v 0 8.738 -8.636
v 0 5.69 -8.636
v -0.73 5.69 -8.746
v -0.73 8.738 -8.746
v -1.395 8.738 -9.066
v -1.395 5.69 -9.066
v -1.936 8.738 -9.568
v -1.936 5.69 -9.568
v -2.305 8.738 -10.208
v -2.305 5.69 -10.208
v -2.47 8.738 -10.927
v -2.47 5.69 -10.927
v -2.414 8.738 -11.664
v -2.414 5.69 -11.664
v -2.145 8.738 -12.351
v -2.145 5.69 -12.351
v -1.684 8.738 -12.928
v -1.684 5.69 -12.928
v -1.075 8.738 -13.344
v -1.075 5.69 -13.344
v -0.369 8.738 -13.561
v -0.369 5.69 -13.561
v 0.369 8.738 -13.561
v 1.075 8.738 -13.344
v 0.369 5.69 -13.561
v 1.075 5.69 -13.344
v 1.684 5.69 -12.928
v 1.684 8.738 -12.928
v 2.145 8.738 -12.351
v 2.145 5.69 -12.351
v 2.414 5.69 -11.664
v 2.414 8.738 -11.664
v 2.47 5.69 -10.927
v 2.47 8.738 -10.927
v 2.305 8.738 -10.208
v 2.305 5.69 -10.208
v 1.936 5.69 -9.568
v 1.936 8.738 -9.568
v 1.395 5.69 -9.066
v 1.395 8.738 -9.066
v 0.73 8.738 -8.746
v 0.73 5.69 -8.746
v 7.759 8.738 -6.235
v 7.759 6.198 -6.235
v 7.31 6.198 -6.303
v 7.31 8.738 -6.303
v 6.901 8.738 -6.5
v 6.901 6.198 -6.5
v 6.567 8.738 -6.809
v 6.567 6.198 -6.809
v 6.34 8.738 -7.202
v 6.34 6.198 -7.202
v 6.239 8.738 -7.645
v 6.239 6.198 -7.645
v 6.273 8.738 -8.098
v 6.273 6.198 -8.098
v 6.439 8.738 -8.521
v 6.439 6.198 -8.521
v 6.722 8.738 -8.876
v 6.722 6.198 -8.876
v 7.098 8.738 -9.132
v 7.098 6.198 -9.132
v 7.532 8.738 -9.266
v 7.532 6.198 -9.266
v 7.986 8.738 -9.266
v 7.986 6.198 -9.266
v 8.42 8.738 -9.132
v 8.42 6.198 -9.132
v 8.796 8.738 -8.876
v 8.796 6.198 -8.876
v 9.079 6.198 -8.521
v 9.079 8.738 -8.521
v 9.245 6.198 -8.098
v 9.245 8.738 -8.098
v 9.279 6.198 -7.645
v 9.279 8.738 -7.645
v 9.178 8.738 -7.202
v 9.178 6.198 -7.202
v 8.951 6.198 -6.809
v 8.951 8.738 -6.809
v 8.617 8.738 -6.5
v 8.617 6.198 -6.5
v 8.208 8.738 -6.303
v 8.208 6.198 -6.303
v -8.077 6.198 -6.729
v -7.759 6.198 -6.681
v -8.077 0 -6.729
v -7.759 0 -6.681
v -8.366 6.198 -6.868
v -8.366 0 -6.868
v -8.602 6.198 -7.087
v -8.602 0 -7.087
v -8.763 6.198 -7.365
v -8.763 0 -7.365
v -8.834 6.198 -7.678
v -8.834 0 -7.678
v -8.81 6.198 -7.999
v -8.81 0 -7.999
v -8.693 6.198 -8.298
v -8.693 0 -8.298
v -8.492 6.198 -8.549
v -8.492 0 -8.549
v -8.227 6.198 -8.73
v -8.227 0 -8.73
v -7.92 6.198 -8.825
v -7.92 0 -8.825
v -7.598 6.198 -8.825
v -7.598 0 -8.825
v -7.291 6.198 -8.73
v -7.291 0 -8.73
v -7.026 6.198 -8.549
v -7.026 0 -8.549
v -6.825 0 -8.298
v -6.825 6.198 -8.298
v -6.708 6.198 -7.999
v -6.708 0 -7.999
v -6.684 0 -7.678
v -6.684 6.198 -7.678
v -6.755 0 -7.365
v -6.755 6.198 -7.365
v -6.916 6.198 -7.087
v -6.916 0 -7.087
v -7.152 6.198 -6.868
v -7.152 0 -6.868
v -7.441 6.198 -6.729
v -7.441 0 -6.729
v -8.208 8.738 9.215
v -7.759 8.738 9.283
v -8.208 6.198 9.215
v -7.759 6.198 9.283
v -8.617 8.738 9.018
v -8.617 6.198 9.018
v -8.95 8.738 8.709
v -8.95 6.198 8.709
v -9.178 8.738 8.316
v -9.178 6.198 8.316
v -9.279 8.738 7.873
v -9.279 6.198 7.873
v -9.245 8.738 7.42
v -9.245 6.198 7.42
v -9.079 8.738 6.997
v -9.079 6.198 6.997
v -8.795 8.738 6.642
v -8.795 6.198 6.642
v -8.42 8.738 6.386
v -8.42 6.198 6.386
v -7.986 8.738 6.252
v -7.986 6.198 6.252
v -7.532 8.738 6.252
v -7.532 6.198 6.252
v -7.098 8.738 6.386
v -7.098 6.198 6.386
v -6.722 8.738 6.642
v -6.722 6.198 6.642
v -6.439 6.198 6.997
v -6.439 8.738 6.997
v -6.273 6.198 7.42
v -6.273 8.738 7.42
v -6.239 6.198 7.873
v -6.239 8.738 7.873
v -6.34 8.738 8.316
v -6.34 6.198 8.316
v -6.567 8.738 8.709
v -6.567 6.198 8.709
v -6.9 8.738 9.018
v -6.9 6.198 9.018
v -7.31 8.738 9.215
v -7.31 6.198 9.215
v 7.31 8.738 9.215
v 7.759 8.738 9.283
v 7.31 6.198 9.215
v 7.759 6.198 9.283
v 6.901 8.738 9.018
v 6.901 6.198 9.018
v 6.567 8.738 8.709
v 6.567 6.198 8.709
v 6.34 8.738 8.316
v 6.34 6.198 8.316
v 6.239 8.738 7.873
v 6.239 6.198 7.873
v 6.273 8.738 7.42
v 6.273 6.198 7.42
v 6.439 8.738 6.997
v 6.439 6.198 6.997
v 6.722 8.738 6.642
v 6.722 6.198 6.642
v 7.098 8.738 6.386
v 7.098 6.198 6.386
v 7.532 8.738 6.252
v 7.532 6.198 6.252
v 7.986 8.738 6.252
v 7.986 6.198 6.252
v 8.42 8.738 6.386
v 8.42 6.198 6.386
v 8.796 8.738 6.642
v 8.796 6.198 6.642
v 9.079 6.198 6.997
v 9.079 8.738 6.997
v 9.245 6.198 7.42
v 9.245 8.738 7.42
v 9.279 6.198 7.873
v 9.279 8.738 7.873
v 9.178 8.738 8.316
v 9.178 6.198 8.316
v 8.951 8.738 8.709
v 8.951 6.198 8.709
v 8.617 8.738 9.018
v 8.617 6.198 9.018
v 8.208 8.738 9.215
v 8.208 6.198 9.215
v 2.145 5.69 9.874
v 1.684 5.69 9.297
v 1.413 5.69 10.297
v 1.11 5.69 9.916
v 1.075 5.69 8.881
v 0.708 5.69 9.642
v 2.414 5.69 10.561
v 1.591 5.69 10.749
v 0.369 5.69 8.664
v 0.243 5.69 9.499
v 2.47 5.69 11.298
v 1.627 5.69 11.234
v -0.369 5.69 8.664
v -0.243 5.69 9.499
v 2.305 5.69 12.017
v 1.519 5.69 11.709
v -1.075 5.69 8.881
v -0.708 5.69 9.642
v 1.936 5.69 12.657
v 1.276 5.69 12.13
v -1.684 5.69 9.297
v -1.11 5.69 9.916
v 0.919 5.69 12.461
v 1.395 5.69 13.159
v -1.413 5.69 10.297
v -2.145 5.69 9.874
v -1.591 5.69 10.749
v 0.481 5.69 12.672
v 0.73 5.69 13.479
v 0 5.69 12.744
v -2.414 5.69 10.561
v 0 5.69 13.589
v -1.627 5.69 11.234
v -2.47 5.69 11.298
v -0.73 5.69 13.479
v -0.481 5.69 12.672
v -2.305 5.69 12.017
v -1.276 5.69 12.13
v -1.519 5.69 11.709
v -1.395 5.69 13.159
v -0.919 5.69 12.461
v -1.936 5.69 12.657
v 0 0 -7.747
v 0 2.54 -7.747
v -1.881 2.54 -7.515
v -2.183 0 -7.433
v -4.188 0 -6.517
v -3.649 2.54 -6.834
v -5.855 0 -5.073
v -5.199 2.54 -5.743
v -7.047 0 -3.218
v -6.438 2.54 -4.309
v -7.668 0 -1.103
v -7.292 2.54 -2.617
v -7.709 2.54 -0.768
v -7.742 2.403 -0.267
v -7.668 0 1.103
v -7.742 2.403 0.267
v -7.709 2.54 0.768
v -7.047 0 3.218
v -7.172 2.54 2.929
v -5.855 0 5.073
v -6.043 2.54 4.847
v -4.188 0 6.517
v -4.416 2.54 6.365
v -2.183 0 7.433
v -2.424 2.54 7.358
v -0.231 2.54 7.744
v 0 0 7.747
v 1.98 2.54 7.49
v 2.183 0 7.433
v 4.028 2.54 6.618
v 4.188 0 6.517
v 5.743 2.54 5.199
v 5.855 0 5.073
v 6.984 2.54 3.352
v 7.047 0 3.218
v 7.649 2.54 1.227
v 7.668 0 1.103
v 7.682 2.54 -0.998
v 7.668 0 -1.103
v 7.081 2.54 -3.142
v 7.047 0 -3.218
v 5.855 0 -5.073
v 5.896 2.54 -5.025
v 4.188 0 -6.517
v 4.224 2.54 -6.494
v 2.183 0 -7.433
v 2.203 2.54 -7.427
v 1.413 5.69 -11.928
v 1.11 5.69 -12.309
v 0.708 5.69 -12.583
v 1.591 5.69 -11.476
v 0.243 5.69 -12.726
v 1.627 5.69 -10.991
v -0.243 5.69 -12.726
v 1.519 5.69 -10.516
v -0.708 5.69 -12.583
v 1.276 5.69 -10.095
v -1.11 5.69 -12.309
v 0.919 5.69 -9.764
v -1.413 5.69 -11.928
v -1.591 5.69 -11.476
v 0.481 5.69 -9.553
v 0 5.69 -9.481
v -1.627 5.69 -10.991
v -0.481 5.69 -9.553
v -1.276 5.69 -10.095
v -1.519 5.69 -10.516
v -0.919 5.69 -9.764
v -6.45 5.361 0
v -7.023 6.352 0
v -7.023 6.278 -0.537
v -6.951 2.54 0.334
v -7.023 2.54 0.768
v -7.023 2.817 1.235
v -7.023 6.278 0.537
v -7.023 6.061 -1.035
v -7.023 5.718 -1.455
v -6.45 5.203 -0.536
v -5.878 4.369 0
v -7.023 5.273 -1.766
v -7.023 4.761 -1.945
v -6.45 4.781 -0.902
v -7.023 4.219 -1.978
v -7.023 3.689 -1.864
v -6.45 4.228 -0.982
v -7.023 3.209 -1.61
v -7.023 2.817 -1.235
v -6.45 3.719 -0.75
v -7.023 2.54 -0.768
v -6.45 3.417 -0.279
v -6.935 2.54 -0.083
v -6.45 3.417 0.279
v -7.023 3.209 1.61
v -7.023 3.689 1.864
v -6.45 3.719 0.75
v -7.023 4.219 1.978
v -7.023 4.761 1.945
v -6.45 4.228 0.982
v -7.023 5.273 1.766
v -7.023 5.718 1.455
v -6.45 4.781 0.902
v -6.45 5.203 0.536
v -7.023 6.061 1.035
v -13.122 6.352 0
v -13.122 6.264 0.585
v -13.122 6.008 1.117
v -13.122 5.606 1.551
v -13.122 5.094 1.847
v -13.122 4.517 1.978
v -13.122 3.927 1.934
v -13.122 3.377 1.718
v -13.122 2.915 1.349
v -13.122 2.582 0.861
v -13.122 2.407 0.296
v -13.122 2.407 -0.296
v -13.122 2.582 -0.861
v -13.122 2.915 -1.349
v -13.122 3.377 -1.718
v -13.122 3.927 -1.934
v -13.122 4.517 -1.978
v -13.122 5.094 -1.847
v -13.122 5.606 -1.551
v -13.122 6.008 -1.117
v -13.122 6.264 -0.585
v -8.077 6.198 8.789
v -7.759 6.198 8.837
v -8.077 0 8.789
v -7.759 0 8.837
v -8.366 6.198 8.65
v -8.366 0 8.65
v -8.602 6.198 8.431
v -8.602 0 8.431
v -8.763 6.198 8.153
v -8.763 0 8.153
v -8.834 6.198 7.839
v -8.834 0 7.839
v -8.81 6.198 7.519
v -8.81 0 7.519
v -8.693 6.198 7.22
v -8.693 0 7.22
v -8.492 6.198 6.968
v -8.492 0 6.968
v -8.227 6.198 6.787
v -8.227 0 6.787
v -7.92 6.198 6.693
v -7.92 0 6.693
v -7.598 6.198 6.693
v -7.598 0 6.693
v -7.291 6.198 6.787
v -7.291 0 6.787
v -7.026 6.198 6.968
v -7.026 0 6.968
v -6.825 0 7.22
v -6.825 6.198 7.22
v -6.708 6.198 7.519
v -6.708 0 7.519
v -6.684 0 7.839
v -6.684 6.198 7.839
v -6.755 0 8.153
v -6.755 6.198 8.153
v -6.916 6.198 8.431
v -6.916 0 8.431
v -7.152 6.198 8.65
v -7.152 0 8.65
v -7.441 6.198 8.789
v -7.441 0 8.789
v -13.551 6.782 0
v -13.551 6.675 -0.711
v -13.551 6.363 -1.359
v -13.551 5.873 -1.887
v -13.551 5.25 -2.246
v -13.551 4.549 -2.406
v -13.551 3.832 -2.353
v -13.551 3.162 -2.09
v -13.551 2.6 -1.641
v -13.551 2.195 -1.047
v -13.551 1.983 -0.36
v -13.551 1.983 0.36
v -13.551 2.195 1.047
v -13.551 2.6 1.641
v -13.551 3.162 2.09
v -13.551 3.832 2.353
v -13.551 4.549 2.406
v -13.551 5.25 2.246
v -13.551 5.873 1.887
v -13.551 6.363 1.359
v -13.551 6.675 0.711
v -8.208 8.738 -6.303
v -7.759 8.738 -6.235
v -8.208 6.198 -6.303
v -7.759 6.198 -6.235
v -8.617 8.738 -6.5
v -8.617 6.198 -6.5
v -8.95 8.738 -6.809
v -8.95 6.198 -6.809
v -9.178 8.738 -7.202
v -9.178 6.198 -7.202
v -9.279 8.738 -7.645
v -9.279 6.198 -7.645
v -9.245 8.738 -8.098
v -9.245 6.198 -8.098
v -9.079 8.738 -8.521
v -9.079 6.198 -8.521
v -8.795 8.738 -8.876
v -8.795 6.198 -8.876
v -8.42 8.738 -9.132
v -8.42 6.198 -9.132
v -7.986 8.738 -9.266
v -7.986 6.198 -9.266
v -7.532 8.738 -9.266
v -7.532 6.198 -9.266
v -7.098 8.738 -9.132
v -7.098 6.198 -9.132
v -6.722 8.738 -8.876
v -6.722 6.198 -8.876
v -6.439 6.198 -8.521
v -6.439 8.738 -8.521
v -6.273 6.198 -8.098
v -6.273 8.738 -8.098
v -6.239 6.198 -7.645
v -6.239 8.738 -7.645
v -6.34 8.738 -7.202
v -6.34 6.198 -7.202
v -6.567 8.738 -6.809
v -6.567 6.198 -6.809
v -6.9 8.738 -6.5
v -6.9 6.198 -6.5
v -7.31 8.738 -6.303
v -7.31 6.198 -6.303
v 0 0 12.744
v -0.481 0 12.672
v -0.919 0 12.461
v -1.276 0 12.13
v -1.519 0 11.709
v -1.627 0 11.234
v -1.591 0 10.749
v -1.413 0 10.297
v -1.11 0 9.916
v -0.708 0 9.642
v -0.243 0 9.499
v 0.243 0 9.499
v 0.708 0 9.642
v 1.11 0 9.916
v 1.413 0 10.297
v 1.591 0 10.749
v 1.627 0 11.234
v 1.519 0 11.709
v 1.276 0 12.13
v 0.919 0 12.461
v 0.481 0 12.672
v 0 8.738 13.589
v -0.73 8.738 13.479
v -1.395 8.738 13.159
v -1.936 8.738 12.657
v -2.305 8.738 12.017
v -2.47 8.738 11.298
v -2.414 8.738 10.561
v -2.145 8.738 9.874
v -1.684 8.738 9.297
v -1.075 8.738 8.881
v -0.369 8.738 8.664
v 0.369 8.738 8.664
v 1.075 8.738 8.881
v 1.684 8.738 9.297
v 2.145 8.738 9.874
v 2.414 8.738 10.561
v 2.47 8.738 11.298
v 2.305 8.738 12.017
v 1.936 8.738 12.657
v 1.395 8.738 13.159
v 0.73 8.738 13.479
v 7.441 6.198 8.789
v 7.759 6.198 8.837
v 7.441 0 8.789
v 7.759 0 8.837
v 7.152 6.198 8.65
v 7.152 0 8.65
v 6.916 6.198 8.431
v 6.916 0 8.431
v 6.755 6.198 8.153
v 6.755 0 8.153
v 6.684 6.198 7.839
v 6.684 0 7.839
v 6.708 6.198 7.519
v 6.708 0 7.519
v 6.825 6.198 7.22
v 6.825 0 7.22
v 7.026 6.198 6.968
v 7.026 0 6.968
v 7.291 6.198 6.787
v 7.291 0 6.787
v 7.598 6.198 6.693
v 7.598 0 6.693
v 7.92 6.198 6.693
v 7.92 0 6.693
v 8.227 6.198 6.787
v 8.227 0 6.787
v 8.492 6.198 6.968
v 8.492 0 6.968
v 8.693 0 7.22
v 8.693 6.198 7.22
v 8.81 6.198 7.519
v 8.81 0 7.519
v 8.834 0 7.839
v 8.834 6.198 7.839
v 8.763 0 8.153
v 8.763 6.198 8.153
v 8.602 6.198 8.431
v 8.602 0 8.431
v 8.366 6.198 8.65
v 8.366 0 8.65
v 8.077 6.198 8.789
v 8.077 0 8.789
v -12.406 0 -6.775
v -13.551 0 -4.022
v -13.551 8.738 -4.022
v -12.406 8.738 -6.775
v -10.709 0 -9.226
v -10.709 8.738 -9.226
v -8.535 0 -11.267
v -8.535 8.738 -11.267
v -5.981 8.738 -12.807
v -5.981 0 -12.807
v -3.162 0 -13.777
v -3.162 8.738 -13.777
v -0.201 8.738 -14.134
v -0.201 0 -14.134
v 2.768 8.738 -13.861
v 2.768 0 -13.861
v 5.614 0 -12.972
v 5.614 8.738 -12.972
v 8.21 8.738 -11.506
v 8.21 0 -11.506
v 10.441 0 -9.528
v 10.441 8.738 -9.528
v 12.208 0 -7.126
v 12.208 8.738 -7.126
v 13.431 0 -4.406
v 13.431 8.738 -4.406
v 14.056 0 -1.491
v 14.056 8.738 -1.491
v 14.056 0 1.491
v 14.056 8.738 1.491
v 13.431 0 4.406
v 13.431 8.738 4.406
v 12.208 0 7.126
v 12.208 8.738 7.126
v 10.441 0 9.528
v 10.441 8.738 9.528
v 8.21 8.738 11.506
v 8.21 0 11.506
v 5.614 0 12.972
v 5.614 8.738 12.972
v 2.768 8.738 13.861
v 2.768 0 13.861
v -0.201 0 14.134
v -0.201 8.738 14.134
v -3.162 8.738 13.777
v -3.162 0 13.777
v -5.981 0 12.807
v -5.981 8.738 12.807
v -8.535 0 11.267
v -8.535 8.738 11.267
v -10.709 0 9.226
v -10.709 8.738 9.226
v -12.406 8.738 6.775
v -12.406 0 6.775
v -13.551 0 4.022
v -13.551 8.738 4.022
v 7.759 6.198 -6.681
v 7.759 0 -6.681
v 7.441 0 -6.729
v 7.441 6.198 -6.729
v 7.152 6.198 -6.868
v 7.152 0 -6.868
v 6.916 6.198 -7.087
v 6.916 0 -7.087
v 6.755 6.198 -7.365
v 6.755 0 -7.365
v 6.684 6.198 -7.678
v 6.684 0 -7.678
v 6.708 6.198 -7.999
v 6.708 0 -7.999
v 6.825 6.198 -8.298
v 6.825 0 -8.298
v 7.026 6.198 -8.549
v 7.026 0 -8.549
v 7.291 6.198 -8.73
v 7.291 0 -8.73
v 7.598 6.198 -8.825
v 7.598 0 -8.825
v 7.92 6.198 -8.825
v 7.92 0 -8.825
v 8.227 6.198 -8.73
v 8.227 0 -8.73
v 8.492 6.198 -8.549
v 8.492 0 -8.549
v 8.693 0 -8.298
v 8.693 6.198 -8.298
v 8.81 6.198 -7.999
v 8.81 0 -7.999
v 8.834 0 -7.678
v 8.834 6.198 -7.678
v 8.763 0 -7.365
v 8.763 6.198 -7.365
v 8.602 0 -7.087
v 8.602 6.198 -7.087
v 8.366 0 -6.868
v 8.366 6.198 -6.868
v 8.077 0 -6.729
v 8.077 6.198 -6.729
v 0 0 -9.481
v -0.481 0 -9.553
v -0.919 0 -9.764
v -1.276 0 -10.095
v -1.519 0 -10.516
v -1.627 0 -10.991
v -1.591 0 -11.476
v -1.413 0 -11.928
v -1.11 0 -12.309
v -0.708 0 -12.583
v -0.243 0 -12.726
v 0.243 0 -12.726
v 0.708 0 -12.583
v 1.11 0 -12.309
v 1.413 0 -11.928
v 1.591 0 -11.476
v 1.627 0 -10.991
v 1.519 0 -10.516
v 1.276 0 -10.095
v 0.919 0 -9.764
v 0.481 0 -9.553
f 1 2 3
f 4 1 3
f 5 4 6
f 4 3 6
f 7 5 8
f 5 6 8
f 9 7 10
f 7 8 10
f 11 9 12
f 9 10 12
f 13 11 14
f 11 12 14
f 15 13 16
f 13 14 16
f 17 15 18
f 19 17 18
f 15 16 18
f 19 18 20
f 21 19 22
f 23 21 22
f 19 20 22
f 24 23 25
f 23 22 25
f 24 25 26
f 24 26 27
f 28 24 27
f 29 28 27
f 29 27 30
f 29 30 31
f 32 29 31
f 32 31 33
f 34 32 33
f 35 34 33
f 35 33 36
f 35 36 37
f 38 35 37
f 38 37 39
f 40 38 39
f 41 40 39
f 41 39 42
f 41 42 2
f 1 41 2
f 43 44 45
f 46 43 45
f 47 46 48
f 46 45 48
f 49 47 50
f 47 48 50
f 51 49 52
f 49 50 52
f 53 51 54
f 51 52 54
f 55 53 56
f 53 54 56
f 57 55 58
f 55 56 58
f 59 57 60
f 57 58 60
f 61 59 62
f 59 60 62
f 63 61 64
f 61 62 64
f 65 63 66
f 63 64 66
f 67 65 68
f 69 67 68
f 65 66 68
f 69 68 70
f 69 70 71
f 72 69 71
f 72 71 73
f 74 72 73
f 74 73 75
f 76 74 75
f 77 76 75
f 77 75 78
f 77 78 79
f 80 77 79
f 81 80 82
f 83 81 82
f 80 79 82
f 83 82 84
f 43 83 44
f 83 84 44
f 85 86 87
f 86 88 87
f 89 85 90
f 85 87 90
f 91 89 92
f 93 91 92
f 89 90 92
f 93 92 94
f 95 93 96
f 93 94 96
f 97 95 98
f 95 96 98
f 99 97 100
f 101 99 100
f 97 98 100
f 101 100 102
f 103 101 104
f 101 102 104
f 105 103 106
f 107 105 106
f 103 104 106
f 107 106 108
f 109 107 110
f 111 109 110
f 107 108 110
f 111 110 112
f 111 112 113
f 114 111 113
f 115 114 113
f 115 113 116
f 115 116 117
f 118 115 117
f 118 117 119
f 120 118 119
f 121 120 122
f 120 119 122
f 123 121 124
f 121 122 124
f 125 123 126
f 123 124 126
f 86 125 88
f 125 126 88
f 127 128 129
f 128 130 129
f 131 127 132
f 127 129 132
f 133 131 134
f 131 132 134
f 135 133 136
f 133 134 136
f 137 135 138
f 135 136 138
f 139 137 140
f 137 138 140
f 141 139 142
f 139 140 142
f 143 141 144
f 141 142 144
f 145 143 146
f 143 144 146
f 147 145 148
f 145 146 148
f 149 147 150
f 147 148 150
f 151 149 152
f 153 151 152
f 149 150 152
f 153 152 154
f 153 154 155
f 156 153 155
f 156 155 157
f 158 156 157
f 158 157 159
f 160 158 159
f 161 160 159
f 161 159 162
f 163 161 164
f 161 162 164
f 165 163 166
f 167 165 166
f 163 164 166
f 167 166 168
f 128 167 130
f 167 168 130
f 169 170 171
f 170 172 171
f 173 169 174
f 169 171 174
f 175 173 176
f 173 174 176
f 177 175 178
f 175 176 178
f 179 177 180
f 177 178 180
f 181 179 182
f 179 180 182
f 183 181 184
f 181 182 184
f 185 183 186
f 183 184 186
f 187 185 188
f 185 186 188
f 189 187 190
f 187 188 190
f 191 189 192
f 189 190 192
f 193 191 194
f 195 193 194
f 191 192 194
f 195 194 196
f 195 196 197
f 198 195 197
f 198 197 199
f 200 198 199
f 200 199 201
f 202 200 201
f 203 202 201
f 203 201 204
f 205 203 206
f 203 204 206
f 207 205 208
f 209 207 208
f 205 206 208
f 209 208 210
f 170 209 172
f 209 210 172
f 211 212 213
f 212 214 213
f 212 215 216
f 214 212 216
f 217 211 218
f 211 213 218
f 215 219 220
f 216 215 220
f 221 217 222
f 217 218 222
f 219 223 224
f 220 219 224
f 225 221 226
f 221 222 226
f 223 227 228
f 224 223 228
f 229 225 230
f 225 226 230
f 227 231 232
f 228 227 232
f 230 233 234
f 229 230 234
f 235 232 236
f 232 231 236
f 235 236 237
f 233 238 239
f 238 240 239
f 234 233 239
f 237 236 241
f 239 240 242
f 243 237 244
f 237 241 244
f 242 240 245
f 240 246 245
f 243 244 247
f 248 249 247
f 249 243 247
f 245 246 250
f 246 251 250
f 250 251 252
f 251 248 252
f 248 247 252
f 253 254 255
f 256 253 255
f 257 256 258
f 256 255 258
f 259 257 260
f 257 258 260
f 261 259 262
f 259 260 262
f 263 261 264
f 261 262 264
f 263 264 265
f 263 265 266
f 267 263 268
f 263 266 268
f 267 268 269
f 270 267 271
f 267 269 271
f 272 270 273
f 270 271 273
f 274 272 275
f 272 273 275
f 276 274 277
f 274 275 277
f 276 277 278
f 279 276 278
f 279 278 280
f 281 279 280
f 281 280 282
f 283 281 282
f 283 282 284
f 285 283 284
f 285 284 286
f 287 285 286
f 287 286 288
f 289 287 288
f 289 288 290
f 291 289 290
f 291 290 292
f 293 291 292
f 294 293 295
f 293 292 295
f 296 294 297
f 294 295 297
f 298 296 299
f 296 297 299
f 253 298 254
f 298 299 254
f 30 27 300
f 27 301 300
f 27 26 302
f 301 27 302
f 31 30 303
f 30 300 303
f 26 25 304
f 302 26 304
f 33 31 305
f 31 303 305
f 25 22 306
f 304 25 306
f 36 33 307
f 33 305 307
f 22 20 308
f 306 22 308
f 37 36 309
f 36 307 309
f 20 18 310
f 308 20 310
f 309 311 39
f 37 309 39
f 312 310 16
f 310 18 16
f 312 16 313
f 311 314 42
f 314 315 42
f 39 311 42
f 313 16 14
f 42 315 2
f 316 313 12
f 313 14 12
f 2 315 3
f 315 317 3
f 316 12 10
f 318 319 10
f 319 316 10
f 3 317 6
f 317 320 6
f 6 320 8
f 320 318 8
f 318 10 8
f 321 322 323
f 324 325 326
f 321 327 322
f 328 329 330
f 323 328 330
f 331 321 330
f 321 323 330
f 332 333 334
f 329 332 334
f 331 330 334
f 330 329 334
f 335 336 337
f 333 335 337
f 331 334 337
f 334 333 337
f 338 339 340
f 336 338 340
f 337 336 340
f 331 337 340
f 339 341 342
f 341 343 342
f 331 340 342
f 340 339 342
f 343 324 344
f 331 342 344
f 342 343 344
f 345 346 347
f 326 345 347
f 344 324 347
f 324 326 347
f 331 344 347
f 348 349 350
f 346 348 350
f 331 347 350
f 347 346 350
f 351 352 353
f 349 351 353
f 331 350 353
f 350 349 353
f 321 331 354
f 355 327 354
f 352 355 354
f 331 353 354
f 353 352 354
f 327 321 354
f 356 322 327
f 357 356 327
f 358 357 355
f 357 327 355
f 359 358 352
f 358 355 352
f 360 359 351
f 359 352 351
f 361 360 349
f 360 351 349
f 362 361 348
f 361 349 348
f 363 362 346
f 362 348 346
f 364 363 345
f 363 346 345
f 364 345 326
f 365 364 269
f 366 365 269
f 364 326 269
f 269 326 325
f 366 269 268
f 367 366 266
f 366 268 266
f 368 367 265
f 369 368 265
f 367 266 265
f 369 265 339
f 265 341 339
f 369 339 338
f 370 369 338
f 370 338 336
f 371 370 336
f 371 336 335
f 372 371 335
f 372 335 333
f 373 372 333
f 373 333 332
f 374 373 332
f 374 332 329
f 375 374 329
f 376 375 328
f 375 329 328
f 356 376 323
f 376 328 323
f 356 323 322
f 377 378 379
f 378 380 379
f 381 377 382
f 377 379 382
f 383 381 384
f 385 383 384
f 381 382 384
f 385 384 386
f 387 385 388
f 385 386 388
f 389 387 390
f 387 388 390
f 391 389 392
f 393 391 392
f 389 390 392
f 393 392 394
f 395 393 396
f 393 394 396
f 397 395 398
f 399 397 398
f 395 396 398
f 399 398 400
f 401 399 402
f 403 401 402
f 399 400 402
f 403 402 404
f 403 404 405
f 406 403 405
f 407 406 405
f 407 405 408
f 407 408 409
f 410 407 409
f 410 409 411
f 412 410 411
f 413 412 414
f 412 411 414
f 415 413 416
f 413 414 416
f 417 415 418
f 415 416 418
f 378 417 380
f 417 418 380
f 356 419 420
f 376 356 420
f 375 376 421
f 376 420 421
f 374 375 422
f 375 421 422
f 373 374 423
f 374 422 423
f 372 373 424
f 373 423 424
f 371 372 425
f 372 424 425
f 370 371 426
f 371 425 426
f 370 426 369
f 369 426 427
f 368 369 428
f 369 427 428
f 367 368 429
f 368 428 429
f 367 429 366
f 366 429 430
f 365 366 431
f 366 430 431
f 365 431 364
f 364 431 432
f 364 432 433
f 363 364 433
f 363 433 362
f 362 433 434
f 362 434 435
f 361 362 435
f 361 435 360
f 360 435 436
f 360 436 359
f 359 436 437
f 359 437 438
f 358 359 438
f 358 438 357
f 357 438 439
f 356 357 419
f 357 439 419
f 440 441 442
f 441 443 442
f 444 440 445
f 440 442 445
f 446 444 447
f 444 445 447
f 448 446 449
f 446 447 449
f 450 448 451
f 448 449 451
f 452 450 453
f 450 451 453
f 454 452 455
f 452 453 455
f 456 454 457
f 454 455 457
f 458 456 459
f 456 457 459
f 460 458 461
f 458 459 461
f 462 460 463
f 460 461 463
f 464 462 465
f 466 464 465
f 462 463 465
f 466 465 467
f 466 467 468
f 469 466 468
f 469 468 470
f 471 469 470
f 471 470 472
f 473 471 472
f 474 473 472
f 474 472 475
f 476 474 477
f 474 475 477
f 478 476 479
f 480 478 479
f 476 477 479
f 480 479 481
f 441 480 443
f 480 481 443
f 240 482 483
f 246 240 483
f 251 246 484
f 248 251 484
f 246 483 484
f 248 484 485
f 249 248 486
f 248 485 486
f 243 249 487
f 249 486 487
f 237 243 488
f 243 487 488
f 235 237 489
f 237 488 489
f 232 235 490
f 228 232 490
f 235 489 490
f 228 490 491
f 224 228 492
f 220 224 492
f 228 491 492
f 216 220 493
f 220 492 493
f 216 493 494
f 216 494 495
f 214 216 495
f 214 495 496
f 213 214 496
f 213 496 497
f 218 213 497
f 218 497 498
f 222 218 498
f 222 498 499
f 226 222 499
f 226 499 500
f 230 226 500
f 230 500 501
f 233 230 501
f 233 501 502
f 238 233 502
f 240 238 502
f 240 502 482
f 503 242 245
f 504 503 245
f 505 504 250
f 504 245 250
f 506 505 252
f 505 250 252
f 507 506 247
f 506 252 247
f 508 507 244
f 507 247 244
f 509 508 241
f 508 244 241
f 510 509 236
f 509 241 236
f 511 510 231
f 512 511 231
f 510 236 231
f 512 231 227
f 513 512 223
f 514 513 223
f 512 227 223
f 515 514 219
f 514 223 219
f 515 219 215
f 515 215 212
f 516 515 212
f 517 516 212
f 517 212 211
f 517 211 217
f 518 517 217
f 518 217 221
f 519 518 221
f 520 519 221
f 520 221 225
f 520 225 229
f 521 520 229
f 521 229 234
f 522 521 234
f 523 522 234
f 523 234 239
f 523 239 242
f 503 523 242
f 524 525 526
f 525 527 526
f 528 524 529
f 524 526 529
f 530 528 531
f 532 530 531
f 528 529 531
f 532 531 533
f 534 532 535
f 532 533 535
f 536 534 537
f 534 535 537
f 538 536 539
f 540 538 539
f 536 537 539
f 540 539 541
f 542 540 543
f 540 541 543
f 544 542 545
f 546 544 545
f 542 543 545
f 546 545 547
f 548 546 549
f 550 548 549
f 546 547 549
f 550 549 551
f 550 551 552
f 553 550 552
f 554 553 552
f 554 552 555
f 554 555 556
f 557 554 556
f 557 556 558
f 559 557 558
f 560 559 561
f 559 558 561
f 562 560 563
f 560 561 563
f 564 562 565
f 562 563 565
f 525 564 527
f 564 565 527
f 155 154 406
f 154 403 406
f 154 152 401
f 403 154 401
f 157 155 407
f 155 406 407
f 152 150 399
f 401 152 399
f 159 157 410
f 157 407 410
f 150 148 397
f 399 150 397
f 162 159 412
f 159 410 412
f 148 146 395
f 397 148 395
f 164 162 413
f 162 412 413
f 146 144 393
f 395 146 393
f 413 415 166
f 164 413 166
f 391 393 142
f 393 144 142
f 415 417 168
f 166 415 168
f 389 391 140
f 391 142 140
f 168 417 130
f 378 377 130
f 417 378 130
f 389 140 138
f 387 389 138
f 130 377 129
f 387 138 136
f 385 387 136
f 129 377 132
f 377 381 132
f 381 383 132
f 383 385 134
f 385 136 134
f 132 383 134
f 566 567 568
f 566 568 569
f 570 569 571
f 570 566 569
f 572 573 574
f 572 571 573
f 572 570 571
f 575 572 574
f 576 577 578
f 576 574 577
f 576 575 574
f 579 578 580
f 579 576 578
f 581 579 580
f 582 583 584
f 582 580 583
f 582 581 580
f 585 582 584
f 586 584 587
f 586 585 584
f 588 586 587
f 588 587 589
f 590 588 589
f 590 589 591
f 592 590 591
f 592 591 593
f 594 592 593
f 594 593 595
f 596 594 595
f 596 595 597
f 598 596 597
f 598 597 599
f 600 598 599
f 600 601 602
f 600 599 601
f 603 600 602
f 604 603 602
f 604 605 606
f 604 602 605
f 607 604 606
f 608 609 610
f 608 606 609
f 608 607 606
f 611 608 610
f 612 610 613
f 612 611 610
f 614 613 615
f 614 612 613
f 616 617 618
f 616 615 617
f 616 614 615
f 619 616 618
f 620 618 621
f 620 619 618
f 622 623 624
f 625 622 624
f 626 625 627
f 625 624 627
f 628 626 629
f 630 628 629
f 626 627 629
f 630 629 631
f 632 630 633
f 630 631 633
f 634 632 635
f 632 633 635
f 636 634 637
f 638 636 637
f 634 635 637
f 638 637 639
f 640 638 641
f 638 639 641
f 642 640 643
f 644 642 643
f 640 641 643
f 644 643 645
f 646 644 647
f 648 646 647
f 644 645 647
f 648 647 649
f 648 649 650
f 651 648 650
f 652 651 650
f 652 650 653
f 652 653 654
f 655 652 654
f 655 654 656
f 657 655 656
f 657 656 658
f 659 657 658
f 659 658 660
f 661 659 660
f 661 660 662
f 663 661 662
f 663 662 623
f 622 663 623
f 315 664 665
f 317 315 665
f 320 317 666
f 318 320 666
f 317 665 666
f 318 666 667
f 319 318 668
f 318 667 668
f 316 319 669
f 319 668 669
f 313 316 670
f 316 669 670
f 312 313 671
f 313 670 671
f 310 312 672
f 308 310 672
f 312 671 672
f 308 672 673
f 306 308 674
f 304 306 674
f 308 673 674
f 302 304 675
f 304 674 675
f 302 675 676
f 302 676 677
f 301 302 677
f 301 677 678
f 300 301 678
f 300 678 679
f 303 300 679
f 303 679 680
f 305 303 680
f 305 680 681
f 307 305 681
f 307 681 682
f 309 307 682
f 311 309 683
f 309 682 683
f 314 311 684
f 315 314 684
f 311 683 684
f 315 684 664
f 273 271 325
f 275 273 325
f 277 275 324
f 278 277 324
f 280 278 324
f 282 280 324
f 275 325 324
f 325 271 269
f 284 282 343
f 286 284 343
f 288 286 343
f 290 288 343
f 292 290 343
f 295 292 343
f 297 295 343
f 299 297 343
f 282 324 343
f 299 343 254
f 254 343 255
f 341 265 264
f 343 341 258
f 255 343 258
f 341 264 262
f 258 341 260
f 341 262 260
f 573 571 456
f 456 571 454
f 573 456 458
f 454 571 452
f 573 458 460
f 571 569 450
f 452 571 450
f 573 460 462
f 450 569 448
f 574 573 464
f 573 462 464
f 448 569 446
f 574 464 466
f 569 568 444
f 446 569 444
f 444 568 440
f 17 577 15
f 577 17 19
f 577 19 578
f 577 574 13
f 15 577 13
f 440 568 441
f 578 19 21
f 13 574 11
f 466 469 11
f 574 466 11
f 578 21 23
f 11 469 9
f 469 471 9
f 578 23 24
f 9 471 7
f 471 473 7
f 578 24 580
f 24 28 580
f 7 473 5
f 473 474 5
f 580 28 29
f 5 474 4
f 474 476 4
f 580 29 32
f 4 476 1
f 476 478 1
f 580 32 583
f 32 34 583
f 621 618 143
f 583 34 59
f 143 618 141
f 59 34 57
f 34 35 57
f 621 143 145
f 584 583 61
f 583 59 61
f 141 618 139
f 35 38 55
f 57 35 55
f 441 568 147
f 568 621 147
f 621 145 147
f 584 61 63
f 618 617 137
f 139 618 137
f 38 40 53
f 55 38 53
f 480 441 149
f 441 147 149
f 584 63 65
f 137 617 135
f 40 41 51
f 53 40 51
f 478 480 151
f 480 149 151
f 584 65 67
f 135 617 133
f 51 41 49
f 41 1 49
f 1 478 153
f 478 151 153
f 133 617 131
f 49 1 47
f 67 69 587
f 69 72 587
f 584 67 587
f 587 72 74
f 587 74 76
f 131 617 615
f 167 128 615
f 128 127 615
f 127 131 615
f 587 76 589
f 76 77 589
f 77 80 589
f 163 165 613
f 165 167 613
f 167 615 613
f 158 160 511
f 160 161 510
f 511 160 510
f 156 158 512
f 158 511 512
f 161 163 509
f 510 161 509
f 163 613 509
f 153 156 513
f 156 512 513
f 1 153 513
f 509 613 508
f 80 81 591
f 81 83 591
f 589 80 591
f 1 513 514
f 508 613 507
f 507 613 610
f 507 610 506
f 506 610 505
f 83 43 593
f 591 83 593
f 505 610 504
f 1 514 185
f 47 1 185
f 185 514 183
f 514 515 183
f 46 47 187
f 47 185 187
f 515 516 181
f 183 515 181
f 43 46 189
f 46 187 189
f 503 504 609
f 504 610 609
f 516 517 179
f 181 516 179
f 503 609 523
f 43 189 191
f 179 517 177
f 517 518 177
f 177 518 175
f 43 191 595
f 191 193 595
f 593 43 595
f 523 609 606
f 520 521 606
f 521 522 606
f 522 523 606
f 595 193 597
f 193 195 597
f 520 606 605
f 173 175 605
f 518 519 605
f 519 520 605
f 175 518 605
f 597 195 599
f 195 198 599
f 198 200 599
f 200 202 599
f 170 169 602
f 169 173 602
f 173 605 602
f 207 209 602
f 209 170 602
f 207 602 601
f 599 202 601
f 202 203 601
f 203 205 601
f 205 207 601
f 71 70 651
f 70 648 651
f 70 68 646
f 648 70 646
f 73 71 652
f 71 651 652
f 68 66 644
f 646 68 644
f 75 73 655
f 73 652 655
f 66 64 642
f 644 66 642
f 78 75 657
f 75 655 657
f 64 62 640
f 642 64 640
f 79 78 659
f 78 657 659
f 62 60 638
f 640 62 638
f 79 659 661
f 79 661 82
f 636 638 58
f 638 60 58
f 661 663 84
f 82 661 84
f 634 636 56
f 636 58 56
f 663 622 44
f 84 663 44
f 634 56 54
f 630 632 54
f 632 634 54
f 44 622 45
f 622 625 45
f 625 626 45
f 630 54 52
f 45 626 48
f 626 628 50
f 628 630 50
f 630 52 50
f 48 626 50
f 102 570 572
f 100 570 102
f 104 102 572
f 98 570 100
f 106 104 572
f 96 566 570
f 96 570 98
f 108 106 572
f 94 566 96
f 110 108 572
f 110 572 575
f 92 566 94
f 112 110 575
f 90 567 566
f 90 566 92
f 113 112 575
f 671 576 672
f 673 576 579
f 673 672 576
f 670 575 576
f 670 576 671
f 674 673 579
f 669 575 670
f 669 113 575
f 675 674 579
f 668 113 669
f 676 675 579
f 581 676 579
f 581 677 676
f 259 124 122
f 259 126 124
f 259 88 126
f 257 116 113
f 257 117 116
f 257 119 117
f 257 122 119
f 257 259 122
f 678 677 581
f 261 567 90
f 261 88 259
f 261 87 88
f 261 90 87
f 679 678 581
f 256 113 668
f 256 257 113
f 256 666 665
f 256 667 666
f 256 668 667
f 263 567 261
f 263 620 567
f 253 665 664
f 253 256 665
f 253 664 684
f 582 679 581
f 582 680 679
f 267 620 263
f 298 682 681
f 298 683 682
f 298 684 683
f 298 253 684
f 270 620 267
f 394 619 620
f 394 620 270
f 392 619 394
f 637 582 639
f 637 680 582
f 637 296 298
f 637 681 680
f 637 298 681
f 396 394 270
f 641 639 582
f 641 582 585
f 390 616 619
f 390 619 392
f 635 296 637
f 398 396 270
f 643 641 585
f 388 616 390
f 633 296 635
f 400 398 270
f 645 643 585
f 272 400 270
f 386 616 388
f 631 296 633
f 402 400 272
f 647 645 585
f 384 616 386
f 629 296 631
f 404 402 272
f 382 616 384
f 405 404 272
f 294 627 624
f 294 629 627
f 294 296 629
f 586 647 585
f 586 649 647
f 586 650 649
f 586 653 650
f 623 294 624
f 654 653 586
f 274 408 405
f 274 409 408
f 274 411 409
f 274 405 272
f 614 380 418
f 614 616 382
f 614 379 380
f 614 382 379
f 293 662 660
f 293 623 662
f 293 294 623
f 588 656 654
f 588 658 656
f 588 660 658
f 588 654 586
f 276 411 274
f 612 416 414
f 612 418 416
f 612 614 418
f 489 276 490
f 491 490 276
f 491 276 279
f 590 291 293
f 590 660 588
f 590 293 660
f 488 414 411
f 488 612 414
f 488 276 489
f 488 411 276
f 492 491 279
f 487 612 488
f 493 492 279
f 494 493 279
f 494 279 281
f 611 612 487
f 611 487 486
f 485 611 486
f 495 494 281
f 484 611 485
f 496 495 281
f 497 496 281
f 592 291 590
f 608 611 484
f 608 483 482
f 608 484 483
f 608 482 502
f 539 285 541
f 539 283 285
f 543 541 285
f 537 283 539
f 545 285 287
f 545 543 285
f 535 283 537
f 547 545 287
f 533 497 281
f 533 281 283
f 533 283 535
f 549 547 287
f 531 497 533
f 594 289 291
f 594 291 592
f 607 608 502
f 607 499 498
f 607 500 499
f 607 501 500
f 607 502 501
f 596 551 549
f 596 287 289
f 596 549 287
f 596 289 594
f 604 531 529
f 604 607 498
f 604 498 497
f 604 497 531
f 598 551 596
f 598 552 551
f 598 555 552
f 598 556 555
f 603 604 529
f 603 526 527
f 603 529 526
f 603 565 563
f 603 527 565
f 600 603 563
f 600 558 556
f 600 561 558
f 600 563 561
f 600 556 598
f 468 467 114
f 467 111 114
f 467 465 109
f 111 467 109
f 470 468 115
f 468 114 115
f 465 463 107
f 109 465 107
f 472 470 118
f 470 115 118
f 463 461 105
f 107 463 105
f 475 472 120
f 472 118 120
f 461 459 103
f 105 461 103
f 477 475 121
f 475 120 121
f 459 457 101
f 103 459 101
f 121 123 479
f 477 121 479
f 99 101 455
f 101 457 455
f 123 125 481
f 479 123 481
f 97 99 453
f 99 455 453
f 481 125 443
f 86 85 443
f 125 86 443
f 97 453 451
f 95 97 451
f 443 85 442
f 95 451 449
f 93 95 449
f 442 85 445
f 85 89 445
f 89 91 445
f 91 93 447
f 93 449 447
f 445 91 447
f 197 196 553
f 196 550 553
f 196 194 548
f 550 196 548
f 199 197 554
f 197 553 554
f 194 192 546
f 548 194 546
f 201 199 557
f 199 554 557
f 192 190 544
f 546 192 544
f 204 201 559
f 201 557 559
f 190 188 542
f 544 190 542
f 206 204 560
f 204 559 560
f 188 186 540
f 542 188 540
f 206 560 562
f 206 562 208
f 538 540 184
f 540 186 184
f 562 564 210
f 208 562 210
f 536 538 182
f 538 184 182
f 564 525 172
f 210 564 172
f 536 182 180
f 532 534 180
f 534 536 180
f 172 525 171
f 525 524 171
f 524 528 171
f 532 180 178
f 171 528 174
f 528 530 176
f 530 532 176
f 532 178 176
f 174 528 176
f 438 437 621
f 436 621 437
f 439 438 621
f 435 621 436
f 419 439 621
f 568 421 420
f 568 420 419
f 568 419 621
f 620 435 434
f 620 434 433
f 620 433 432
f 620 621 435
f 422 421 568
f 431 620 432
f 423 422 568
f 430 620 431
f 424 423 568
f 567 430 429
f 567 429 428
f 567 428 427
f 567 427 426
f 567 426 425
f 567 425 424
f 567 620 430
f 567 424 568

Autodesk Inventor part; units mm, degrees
sketch "Sketch_1" plane through (0, 0, 0) normal (0, 0, 1) x (1, 0, 0)
  line L0 (0, 0) -> (0, 8.7376)
  line L1 (0, 8.7376) -> (14.1351, 8.7376)
  line L2 (14.1351, 8.7376) -> (14.1351, 0)
  line L3 (14.1351, 0) -> (0, 0)
  line L4 (0, 0) -> (0, 8.7376)
revolve "Revolution1" add sketch "Sketch_1" angle 360 about axis through (0, 0, 0) along (0, -1, 0)
sketch "Sketch_63" plane through (0, 0, 0) normal (0, 1, 0) x (-1, 0, 0)
  line L0 (20.6184, 14.1351) -> (13.5509, 14.1351)
  line L1 (13.5509, 14.1351) -> (13.5509, -14.1351)
  line L2 (13.5509, -14.1351) -> (20.6184, -14.1351)
  line L3 (20.6184, -14.1351) -> (20.6184, 14.1351)
extrude "Extrusion1" cut sketch "Sketch_63" along normal blind 8.7376
sketch "Sketch_37" plane through (0, 0, 0) normal (0, 0, 1) x (1, 0, 0)
  line L0 (-5.8778, 4.3688) -> (-14.1351, 4.3688)
  line L1 (-14.1351, 4.3688) -> (-14.1351, 8.3376)
  line L2 (-14.1351, 8.3376) -> (-13.5509, 8.3376)
  line L3 (-13.5509, 8.3376) -> (-13.5509, 6.7818)
  line L4 (-13.5509, 6.7818) -> (-13.1216, 6.3525)
  line L5 (-13.1216, 6.3525) -> (-7.0231, 6.3525)
  line L6 (-7.0231, 6.3525) -> (-5.8778, 4.3688)
  line L7 (-5.8778, 4.3688) -> (-14.1351, 4.3688)
revolve "Revolution2" cut sketch "Sketch_37" angle 360 about axis through (-5.8778, 4.3688, 0) along (1, 0, 0)
thread "Thread1" size "10-32 UNF" class "2B" standard "ANSI Unified Screw Threads" length 4.6507
sketch "Sketch4" plane through (0, 0, 0) normal (0, -1, 0) x (1, 0, 0)
  point P0 (0, 0)
hole "Hole1" at (0, 0, 0) direction (0, 1, 0) diameter 15.494 depth 2.54
sketch "Sketch5" plane through (0, 8.7376, 0) normal (0, 1, 0) x (1, 0, 0)
  point P0 (0, -11.1125)
hole "Hole2" at (0, 8.7376, 11.1125) direction (0, -1, 0) diameter 3.2639 depth 8.7376 counterbore diameter 4.953 counterbore depth 3.048
sketch "Sketch6" plane through (0, 8.7376, 0) normal (0, 1, 0) x (1, 0, 0)
  point P0 (0, 11.1125)
hole "Hole3" at (0, 8.7376, -11.1125) direction (0, -1, 0) diameter 3.2639 depth 8.7376 counterbore diameter 4.953 counterbore depth 3.048
sketch "Sketch7" plane through (0, 8.7376, 0) normal (0, 1, 0) x (1, 0, 0)
  point P0 (-7.7589, -7.7589)
hole "Hole4" at (-7.7589, 8.7376, 7.7589) direction (0, -1, 0) diameter 2.1565 depth 8.7376 counterbore diameter 3.048 counterbore depth 2.54 thread size "4-40 UNC" class "2B" standard "ANSI Unified Screw Threads"
pattern_linear "Rectangular Pattern1" count 2 spacing 15.5179 along (1, 0, 0) count 2 spacing 15.5179 along (0, 0, -1) of "Hole4"
ref_plane "a1_XY" through (0, 8.7376, -14.1351) normal (0, 1, 0) x (1, 0, 0)
ref_plane "a1_YZ" through (0, 8.7376, -14.1351) normal (1, 0, 0) x (0, 0, -1)
ref_plane "a1_ZX" through (0, 8.7376, -14.1351) normal (0, 0, -1) x (0, 1, 0)
ref_plane "a2_XY" through (0, 8.7376, 14.1351) normal (0, 1, 0) x (1, 0, 0)
ref_plane "a2_YZ" through (0, 8.7376, 14.1351) normal (1, 0, 0) x (0, 0, -1)
ref_plane "a2_ZX" through (0, 8.7376, 14.1351) normal (0, 0, -1) x (0, 1, 0)
ref_plane "ar3_XY" through (-7.9026, 2.54, 7.9026) normal (0, 1, 0) x (1, 0, 0)
ref_plane "ar3_YZ" through (-7.9026, 2.54, 7.9026) normal (1, 0, 0) x (0, 0, -1)
ref_plane "ar3_ZX" through (-7.9026, 2.54, 7.9026) normal (0, 0, -1) x (0, 1, 0)
ref_plane "ar4_XY" through (7.9026, 2.54, 7.9026) normal (0, 1, 0) x (1, 0, 0)
ref_plane "ar4_YZ" through (7.9026, 2.54, 7.9026) normal (1, 0, 0) x (0, 0, -1)
ref_plane "ar4_ZX" through (7.9026, 2.54, 7.9026) normal (0, 0, -1) x (0, 1, 0)
ref_plane "ar5_XY" through (7.9026, 2.54, -7.9026) normal (0, 1, 0) x (1, 0, 0)
ref_plane "ar5_YZ" through (7.9026, 2.54, -7.9026) normal (1, 0, 0) x (0, 0, -1)
ref_plane "ar5_ZX" through (7.9026, 2.54, -7.9026) normal (0, 0, -1) x (0, 1, 0)
ref_plane "ar6_XY" through (-7.9026, 2.54, -7.9026) normal (0, 1, 0) x (1, 0, 0)
ref_plane "ar6_YZ" through (-7.9026, 2.54, -7.9026) normal (1, 0, 0) x (0, 0, -1)
ref_plane "ar6_ZX" through (-7.9026, 2.54, -7.9026) normal (0, 0, -1) x (0, 1, 0)
ref_plane "b1_XY" through (0, 8.7376, 0) normal (0, 1, 0) x (1, 0, 0)
ref_plane "b1_YZ" through (0, 8.7376, 0) normal (1, 0, 0) x (0, 0, -1)
ref_plane "b1_ZX" through (0, 8.7376, 0) normal (0, 0, -1) x (0, 1, 0)
ref_plane "j_XY" through (0, 0, 0) normal (0, 1, 0) x (1, 0, 0)
ref_plane "j_YZ" through (0, 0, 0) normal (1, 0, 0) x (0, 0, -1)
ref_plane "j_ZX" through (0, 0, 0) normal (0, 0, -1) x (0, 1, 0)
ref_plane "k1_XY" through (-13.5509, 4.3688, 0) normal (0, 0, 1) x (1, 0, 0)
ref_plane "k1_YZ" through (-13.5509, 4.3688, 0) normal (1, 0, 0) x (0, 1, 0)
ref_plane "k1_ZX" through (-13.5509, 4.3688, 0) normal (0, 1, 0) x (0, 0, 1)
ref_plane "k2_XY" through (-13.5509, 8.7376, 0) normal (0, 0, 1) x (1, 0, 0)
ref_plane "k2_YZ" through (-13.5509, 8.7376, 0) normal (1, 0, 0) x (0, 1, 0)
ref_plane "k2_ZX" through (-13.5509, 8.7376, 0) normal (0, 1, 0) x (0, 0, 1)
ref_plane "l1_XY" through (-13.5509, 6.7818, 0) normal (0, 0, 1) x (1, 0, 0)
ref_plane "l1_YZ" through (-13.5509, 6.7818, 0) normal (1, 0, 0) x (0, 1, 0)
ref_plane "l1_ZX" through (-13.5509, 6.7818, 0) normal (0, 1, 0) x (0, 0, 1)
ref_plane "l2_XY" through (-13.5509, 1.9558, 0) normal (0, 0, 1) x (1, 0, 0)
ref_plane "l2_YZ" through (-13.5509, 1.9558, 0) normal (1, 0, 0) x (0, 1, 0)
ref_plane "l2_ZX" through (-13.5509, 1.9558, 0) normal (0, 1, 0) x (0, 0, 1)
ref_plane "po1_XY" through (10.9728, 0, 0) normal (0, 1, 0) x (1, 0, 0)
ref_plane "po1_YZ" through (10.9728, 0, 0) normal (1, 0, 0) x (0, 0, -1)
ref_plane "po1_ZX" through (10.9728, 0, 0) normal (0, 0, -1) x (0, 1, 0)
ref_plane "po2_XY" through (-5.4864, 0, -9.5027) normal (0, 1, 0) x (1, 0, 0)
ref_plane "po2_YZ" through (-5.4864, 0, -9.5027) normal (1, 0, 0) x (0, 0, -1)
ref_plane "po2_ZX" through (-5.4864, 0, -9.5027) normal (0, 0, -1) x (0, 1, 0)
ref_plane "po3_XY" through (-5.4864, 0, 9.5027) normal (0, 1, 0) x (1, 0, 0)
ref_plane "po3_YZ" through (-5.4864, 0, 9.5027) normal (1, 0, 0) x (0, 0, -1)
ref_plane "po3_ZX" through (-5.4864, 0, 9.5027) normal (0, 0, -1) x (0, 1, 0)
ref_plane "r7_XY" through (-1.7526, 8.7376, -11.1125) normal (0, 1, 0) x (1, 0, 0)
ref_plane "r7_YZ" through (-1.7526, 8.7376, -11.1125) normal (1, 0, 0) x (0, 0, -1)
ref_plane "r7_ZX" through (-1.7526, 8.7376, -11.1125) normal (0, 0, -1) x (0, 1, 0)
ref_plane "r71_XY" through (0, 8.7376, 11.1125) normal (0, 1, 0) x (1, 0, 0)
ref_plane "r71_YZ" through (0, 8.7376, 11.1125) normal (1, 0, 0) x (0, 0, -1)
ref_plane "r71_ZX" through (0, 8.7376, 11.1125) normal (0, 0, -1) x (0, 1, 0)
ref_plane "r72_XY" through (1.7526, 8.7376, -11.1125) normal (0, 1, 0) x (1, 0, 0)
ref_plane "r72_YZ" through (1.7526, 8.7376, -11.1125) normal (1, 0, 0) x (0, 0, -1)
ref_plane "r72_ZX" through (1.7526, 8.7376, -11.1125) normal (0, 0, -1) x (0, 1, 0)
ref_plane "r73_XY" through (0, 8.7376, -11.1125) normal (0, 1, 0) x (1, 0, 0)
ref_plane "r73_YZ" through (0, 8.7376, -11.1125) normal (1, 0, 0) x (0, 0, -1)
ref_plane "r73_ZX" through (0, 8.7376, -11.1125) normal (0, 0, -1) x (0, 1, 0)
ref_plane "rg_XY" through (0, 8.7376, 0) normal (0, 1, 0) x (1, 0, 0)
ref_plane "rg_YZ" through (0, 8.7376, 0) normal (1, 0, 0) x (0, 0, -1)
ref_plane "rg_ZX" through (0, 8.7376, 0) normal (0, 0, -1) x (0, 1, 0)
ref_plane "rh_XY" through (0, 8.7376, 0) normal (0, 1, 0) x (1, 0, 0)
ref_plane "rh_YZ" through (0, 8.7376, 0) normal (1, 0, 0) x (0, 0, -1)
ref_plane "rh_ZX" through (0, 8.7376, 0) normal (0, 0, -1) x (0, 1, 0)
ref_plane "rs_1_XY" through (0, 10.5156, -11.1125) normal (0, 1, 0) x (1, 0, 0)
ref_plane "rs_1_YZ" through (0, 10.5156, -11.1125) normal (1, 0, 0) x (0, 0, -1)
ref_plane "rs_1_ZX" through (0, 10.5156, -11.1125) normal (0, 0, -1) x (0, 1, 0)
ref_plane "rs_2_XY" through (-11.1125, 10.5156, 0) normal (0, 1, 0) x (1, 0, 0)
ref_plane "rs_2_YZ" through (-11.1125, 10.5156, 0) normal (1, 0, 0) x (0, 0, -1)
ref_plane "rs_2_ZX" through (-11.1125, 10.5156, 0) normal (0, 0, -1) x (0, 1, 0)
ref_plane "rs_3_XY" through (0, 10.5156, 11.1125) normal (0, 1, 0) x (1, 0, 0)
ref_plane "rs_3_YZ" through (0, 10.5156, 11.1125) normal (1, 0, 0) x (0, 0, -1)
ref_plane "rs_3_ZX" through (0, 10.5156, 11.1125) normal (0, 0, -1) x (0, 1, 0)
ref_plane "rs_4_XY" through (11.1125, 10.5156, 0) normal (0, 1, 0) x (1, 0, 0)
ref_plane "rs_4_YZ" through (11.1125, 10.5156, 0) normal (1, 0, 0) x (0, 0, -1)
ref_plane "rs_4_ZX" through (11.1125, 10.5156, 0) normal (0, 0, -1) x (0, 1, 0)
ref_plane "sc1_XY" through (10.9728, 4.9276, 0) normal (0, 1, 0) x (1, 0, 0)
ref_plane "sc1_YZ" through (10.9728, 4.9276, 0) normal (1, 0, 0) x (0, 0, -1)
ref_plane "sc1_ZX" through (10.9728, 4.9276, 0) normal (0, 0, -1) x (0, 1, 0)
ref_plane "sc2_XY" through (-5.4864, 4.9276, -9.5027) normal (0, 1, 0) x (1, 0, 0)
ref_plane "sc2_YZ" through (-5.4864, 4.9276, -9.5027) normal (1, 0, 0) x (0, 0, -1)
ref_plane "sc2_ZX" through (-5.4864, 4.9276, -9.5027) normal (0, 0, -1) x (0, 1, 0)
ref_plane "sc3_XY" through (-5.4864, 4.9276, 9.5027) normal (0, 1, 0) x (1, 0, 0)
ref_plane "sc3_YZ" through (-5.4864, 4.9276, 9.5027) normal (1, 0, 0) x (0, 0, -1)
ref_plane "sc3_ZX" through (-5.4864, 4.9276, 9.5027) normal (0, 0, -1) x (0, 1, 0)
ref_plane "to_dummy_XY" through (0, 8.7376, 0) normal (0, 1, 0) x (1, 0, 0)
ref_plane "to_dummy_YZ" through (0, 8.7376, 0) normal (1, 0, 0) x (0, 0, -1)
ref_plane "to_dummy_ZX" through (0, 8.7376, 0) normal (0, 0, -1) x (0, 1, 0)
ref_plane "to_nut_XY" through (0, 10.2616, 0) normal (0, 1, 0) x (1, 0, 0)
ref_plane "to_nut_YZ" through (0, 10.2616, 0) normal (1, 0, 0) x (0, 0, -1)
ref_plane "to_nut_ZX" through (0, 10.2616, 0) normal (0, 0, -1) x (0, 1, 0)
ref_plane "to_rod_XY" through (0, 8.7376, 0) normal (0, 1, 0) x (1, 0, 0)
ref_plane "to_rod_YZ" through (0, 8.7376, 0) normal (1, 0, 0) x (0, 0, -1)
ref_plane "to_rod_ZX" through (0, 8.7376, 0) normal (0, 0, -1) x (0, 1, 0)
ref_plane "to_tube_XY" through (0, 2.54, 0) normal (0, 1, 0) x (1, 0, 0)
ref_plane "to_tube_YZ" through (0, 2.54, 0) normal (1, 0, 0) x (0, 0, -1)
ref_plane "to_tube_ZX" through (0, 2.54, 0) normal (0, 0, -1) x (0, 1, 0)
ref_plane "to_wiper_XY" through (0, 8.7376, 0) normal (0, 1, 0) x (1, 0, 0)
ref_plane "to_wiper_YZ" through (0, 8.7376, 0) normal (1, 0, 0) x (0, 0, -1)
ref_plane "to_wiper_ZX" through (0, 8.7376, 0) normal (0, 0, -1) x (0, 1, 0)
ref_plane "track1_XY" through (-7.7851, 0, 0) normal (0, 1, 0) x (1, 0, 0)
ref_plane "track1_YZ" through (-7.7851, 0, 0) normal (1, 0, 0) x (0, 0, -1)
ref_plane "track1_ZX" through (-7.7851, 0, 0) normal (0, 0, -1) x (0, 1, 0)
ref_plane "track2_XY" through (0, 0, -7.7851) normal (0, 1, 0) x (1, 0, 0)
ref_plane "track2_YZ" through (0, 0, -7.7851) normal (1, 0, 0) x (0, 0, -1)
ref_plane "track2_ZX" through (0, 0, -7.7851) normal (0, 0, -1) x (0, 1, 0)
ref_plane "track3_XY" through (7.7851, 0, 0) normal (0, 1, 0) x (1, 0, 0)
ref_plane "track3_YZ" through (7.7851, 0, 0) normal (1, 0, 0) x (0, 0, -1)
ref_plane "track3_ZX" through (7.7851, 0, 0) normal (0, 0, -1) x (0, 1, 0)
ref_plane "track4_XY" through (0, 0, 7.7851) normal (0, 1, 0) x (1, 0, 0)
ref_plane "track4_YZ" through (0, 0, 7.7851) normal (1, 0, 0) x (0, 0, -1)
ref_plane "track4_ZX" through (0, 0, 7.7851) normal (0, 0, -1) x (0, 1, 0)
properties part number "02-2-0.125-FO1_BM_heads_left-bif"
